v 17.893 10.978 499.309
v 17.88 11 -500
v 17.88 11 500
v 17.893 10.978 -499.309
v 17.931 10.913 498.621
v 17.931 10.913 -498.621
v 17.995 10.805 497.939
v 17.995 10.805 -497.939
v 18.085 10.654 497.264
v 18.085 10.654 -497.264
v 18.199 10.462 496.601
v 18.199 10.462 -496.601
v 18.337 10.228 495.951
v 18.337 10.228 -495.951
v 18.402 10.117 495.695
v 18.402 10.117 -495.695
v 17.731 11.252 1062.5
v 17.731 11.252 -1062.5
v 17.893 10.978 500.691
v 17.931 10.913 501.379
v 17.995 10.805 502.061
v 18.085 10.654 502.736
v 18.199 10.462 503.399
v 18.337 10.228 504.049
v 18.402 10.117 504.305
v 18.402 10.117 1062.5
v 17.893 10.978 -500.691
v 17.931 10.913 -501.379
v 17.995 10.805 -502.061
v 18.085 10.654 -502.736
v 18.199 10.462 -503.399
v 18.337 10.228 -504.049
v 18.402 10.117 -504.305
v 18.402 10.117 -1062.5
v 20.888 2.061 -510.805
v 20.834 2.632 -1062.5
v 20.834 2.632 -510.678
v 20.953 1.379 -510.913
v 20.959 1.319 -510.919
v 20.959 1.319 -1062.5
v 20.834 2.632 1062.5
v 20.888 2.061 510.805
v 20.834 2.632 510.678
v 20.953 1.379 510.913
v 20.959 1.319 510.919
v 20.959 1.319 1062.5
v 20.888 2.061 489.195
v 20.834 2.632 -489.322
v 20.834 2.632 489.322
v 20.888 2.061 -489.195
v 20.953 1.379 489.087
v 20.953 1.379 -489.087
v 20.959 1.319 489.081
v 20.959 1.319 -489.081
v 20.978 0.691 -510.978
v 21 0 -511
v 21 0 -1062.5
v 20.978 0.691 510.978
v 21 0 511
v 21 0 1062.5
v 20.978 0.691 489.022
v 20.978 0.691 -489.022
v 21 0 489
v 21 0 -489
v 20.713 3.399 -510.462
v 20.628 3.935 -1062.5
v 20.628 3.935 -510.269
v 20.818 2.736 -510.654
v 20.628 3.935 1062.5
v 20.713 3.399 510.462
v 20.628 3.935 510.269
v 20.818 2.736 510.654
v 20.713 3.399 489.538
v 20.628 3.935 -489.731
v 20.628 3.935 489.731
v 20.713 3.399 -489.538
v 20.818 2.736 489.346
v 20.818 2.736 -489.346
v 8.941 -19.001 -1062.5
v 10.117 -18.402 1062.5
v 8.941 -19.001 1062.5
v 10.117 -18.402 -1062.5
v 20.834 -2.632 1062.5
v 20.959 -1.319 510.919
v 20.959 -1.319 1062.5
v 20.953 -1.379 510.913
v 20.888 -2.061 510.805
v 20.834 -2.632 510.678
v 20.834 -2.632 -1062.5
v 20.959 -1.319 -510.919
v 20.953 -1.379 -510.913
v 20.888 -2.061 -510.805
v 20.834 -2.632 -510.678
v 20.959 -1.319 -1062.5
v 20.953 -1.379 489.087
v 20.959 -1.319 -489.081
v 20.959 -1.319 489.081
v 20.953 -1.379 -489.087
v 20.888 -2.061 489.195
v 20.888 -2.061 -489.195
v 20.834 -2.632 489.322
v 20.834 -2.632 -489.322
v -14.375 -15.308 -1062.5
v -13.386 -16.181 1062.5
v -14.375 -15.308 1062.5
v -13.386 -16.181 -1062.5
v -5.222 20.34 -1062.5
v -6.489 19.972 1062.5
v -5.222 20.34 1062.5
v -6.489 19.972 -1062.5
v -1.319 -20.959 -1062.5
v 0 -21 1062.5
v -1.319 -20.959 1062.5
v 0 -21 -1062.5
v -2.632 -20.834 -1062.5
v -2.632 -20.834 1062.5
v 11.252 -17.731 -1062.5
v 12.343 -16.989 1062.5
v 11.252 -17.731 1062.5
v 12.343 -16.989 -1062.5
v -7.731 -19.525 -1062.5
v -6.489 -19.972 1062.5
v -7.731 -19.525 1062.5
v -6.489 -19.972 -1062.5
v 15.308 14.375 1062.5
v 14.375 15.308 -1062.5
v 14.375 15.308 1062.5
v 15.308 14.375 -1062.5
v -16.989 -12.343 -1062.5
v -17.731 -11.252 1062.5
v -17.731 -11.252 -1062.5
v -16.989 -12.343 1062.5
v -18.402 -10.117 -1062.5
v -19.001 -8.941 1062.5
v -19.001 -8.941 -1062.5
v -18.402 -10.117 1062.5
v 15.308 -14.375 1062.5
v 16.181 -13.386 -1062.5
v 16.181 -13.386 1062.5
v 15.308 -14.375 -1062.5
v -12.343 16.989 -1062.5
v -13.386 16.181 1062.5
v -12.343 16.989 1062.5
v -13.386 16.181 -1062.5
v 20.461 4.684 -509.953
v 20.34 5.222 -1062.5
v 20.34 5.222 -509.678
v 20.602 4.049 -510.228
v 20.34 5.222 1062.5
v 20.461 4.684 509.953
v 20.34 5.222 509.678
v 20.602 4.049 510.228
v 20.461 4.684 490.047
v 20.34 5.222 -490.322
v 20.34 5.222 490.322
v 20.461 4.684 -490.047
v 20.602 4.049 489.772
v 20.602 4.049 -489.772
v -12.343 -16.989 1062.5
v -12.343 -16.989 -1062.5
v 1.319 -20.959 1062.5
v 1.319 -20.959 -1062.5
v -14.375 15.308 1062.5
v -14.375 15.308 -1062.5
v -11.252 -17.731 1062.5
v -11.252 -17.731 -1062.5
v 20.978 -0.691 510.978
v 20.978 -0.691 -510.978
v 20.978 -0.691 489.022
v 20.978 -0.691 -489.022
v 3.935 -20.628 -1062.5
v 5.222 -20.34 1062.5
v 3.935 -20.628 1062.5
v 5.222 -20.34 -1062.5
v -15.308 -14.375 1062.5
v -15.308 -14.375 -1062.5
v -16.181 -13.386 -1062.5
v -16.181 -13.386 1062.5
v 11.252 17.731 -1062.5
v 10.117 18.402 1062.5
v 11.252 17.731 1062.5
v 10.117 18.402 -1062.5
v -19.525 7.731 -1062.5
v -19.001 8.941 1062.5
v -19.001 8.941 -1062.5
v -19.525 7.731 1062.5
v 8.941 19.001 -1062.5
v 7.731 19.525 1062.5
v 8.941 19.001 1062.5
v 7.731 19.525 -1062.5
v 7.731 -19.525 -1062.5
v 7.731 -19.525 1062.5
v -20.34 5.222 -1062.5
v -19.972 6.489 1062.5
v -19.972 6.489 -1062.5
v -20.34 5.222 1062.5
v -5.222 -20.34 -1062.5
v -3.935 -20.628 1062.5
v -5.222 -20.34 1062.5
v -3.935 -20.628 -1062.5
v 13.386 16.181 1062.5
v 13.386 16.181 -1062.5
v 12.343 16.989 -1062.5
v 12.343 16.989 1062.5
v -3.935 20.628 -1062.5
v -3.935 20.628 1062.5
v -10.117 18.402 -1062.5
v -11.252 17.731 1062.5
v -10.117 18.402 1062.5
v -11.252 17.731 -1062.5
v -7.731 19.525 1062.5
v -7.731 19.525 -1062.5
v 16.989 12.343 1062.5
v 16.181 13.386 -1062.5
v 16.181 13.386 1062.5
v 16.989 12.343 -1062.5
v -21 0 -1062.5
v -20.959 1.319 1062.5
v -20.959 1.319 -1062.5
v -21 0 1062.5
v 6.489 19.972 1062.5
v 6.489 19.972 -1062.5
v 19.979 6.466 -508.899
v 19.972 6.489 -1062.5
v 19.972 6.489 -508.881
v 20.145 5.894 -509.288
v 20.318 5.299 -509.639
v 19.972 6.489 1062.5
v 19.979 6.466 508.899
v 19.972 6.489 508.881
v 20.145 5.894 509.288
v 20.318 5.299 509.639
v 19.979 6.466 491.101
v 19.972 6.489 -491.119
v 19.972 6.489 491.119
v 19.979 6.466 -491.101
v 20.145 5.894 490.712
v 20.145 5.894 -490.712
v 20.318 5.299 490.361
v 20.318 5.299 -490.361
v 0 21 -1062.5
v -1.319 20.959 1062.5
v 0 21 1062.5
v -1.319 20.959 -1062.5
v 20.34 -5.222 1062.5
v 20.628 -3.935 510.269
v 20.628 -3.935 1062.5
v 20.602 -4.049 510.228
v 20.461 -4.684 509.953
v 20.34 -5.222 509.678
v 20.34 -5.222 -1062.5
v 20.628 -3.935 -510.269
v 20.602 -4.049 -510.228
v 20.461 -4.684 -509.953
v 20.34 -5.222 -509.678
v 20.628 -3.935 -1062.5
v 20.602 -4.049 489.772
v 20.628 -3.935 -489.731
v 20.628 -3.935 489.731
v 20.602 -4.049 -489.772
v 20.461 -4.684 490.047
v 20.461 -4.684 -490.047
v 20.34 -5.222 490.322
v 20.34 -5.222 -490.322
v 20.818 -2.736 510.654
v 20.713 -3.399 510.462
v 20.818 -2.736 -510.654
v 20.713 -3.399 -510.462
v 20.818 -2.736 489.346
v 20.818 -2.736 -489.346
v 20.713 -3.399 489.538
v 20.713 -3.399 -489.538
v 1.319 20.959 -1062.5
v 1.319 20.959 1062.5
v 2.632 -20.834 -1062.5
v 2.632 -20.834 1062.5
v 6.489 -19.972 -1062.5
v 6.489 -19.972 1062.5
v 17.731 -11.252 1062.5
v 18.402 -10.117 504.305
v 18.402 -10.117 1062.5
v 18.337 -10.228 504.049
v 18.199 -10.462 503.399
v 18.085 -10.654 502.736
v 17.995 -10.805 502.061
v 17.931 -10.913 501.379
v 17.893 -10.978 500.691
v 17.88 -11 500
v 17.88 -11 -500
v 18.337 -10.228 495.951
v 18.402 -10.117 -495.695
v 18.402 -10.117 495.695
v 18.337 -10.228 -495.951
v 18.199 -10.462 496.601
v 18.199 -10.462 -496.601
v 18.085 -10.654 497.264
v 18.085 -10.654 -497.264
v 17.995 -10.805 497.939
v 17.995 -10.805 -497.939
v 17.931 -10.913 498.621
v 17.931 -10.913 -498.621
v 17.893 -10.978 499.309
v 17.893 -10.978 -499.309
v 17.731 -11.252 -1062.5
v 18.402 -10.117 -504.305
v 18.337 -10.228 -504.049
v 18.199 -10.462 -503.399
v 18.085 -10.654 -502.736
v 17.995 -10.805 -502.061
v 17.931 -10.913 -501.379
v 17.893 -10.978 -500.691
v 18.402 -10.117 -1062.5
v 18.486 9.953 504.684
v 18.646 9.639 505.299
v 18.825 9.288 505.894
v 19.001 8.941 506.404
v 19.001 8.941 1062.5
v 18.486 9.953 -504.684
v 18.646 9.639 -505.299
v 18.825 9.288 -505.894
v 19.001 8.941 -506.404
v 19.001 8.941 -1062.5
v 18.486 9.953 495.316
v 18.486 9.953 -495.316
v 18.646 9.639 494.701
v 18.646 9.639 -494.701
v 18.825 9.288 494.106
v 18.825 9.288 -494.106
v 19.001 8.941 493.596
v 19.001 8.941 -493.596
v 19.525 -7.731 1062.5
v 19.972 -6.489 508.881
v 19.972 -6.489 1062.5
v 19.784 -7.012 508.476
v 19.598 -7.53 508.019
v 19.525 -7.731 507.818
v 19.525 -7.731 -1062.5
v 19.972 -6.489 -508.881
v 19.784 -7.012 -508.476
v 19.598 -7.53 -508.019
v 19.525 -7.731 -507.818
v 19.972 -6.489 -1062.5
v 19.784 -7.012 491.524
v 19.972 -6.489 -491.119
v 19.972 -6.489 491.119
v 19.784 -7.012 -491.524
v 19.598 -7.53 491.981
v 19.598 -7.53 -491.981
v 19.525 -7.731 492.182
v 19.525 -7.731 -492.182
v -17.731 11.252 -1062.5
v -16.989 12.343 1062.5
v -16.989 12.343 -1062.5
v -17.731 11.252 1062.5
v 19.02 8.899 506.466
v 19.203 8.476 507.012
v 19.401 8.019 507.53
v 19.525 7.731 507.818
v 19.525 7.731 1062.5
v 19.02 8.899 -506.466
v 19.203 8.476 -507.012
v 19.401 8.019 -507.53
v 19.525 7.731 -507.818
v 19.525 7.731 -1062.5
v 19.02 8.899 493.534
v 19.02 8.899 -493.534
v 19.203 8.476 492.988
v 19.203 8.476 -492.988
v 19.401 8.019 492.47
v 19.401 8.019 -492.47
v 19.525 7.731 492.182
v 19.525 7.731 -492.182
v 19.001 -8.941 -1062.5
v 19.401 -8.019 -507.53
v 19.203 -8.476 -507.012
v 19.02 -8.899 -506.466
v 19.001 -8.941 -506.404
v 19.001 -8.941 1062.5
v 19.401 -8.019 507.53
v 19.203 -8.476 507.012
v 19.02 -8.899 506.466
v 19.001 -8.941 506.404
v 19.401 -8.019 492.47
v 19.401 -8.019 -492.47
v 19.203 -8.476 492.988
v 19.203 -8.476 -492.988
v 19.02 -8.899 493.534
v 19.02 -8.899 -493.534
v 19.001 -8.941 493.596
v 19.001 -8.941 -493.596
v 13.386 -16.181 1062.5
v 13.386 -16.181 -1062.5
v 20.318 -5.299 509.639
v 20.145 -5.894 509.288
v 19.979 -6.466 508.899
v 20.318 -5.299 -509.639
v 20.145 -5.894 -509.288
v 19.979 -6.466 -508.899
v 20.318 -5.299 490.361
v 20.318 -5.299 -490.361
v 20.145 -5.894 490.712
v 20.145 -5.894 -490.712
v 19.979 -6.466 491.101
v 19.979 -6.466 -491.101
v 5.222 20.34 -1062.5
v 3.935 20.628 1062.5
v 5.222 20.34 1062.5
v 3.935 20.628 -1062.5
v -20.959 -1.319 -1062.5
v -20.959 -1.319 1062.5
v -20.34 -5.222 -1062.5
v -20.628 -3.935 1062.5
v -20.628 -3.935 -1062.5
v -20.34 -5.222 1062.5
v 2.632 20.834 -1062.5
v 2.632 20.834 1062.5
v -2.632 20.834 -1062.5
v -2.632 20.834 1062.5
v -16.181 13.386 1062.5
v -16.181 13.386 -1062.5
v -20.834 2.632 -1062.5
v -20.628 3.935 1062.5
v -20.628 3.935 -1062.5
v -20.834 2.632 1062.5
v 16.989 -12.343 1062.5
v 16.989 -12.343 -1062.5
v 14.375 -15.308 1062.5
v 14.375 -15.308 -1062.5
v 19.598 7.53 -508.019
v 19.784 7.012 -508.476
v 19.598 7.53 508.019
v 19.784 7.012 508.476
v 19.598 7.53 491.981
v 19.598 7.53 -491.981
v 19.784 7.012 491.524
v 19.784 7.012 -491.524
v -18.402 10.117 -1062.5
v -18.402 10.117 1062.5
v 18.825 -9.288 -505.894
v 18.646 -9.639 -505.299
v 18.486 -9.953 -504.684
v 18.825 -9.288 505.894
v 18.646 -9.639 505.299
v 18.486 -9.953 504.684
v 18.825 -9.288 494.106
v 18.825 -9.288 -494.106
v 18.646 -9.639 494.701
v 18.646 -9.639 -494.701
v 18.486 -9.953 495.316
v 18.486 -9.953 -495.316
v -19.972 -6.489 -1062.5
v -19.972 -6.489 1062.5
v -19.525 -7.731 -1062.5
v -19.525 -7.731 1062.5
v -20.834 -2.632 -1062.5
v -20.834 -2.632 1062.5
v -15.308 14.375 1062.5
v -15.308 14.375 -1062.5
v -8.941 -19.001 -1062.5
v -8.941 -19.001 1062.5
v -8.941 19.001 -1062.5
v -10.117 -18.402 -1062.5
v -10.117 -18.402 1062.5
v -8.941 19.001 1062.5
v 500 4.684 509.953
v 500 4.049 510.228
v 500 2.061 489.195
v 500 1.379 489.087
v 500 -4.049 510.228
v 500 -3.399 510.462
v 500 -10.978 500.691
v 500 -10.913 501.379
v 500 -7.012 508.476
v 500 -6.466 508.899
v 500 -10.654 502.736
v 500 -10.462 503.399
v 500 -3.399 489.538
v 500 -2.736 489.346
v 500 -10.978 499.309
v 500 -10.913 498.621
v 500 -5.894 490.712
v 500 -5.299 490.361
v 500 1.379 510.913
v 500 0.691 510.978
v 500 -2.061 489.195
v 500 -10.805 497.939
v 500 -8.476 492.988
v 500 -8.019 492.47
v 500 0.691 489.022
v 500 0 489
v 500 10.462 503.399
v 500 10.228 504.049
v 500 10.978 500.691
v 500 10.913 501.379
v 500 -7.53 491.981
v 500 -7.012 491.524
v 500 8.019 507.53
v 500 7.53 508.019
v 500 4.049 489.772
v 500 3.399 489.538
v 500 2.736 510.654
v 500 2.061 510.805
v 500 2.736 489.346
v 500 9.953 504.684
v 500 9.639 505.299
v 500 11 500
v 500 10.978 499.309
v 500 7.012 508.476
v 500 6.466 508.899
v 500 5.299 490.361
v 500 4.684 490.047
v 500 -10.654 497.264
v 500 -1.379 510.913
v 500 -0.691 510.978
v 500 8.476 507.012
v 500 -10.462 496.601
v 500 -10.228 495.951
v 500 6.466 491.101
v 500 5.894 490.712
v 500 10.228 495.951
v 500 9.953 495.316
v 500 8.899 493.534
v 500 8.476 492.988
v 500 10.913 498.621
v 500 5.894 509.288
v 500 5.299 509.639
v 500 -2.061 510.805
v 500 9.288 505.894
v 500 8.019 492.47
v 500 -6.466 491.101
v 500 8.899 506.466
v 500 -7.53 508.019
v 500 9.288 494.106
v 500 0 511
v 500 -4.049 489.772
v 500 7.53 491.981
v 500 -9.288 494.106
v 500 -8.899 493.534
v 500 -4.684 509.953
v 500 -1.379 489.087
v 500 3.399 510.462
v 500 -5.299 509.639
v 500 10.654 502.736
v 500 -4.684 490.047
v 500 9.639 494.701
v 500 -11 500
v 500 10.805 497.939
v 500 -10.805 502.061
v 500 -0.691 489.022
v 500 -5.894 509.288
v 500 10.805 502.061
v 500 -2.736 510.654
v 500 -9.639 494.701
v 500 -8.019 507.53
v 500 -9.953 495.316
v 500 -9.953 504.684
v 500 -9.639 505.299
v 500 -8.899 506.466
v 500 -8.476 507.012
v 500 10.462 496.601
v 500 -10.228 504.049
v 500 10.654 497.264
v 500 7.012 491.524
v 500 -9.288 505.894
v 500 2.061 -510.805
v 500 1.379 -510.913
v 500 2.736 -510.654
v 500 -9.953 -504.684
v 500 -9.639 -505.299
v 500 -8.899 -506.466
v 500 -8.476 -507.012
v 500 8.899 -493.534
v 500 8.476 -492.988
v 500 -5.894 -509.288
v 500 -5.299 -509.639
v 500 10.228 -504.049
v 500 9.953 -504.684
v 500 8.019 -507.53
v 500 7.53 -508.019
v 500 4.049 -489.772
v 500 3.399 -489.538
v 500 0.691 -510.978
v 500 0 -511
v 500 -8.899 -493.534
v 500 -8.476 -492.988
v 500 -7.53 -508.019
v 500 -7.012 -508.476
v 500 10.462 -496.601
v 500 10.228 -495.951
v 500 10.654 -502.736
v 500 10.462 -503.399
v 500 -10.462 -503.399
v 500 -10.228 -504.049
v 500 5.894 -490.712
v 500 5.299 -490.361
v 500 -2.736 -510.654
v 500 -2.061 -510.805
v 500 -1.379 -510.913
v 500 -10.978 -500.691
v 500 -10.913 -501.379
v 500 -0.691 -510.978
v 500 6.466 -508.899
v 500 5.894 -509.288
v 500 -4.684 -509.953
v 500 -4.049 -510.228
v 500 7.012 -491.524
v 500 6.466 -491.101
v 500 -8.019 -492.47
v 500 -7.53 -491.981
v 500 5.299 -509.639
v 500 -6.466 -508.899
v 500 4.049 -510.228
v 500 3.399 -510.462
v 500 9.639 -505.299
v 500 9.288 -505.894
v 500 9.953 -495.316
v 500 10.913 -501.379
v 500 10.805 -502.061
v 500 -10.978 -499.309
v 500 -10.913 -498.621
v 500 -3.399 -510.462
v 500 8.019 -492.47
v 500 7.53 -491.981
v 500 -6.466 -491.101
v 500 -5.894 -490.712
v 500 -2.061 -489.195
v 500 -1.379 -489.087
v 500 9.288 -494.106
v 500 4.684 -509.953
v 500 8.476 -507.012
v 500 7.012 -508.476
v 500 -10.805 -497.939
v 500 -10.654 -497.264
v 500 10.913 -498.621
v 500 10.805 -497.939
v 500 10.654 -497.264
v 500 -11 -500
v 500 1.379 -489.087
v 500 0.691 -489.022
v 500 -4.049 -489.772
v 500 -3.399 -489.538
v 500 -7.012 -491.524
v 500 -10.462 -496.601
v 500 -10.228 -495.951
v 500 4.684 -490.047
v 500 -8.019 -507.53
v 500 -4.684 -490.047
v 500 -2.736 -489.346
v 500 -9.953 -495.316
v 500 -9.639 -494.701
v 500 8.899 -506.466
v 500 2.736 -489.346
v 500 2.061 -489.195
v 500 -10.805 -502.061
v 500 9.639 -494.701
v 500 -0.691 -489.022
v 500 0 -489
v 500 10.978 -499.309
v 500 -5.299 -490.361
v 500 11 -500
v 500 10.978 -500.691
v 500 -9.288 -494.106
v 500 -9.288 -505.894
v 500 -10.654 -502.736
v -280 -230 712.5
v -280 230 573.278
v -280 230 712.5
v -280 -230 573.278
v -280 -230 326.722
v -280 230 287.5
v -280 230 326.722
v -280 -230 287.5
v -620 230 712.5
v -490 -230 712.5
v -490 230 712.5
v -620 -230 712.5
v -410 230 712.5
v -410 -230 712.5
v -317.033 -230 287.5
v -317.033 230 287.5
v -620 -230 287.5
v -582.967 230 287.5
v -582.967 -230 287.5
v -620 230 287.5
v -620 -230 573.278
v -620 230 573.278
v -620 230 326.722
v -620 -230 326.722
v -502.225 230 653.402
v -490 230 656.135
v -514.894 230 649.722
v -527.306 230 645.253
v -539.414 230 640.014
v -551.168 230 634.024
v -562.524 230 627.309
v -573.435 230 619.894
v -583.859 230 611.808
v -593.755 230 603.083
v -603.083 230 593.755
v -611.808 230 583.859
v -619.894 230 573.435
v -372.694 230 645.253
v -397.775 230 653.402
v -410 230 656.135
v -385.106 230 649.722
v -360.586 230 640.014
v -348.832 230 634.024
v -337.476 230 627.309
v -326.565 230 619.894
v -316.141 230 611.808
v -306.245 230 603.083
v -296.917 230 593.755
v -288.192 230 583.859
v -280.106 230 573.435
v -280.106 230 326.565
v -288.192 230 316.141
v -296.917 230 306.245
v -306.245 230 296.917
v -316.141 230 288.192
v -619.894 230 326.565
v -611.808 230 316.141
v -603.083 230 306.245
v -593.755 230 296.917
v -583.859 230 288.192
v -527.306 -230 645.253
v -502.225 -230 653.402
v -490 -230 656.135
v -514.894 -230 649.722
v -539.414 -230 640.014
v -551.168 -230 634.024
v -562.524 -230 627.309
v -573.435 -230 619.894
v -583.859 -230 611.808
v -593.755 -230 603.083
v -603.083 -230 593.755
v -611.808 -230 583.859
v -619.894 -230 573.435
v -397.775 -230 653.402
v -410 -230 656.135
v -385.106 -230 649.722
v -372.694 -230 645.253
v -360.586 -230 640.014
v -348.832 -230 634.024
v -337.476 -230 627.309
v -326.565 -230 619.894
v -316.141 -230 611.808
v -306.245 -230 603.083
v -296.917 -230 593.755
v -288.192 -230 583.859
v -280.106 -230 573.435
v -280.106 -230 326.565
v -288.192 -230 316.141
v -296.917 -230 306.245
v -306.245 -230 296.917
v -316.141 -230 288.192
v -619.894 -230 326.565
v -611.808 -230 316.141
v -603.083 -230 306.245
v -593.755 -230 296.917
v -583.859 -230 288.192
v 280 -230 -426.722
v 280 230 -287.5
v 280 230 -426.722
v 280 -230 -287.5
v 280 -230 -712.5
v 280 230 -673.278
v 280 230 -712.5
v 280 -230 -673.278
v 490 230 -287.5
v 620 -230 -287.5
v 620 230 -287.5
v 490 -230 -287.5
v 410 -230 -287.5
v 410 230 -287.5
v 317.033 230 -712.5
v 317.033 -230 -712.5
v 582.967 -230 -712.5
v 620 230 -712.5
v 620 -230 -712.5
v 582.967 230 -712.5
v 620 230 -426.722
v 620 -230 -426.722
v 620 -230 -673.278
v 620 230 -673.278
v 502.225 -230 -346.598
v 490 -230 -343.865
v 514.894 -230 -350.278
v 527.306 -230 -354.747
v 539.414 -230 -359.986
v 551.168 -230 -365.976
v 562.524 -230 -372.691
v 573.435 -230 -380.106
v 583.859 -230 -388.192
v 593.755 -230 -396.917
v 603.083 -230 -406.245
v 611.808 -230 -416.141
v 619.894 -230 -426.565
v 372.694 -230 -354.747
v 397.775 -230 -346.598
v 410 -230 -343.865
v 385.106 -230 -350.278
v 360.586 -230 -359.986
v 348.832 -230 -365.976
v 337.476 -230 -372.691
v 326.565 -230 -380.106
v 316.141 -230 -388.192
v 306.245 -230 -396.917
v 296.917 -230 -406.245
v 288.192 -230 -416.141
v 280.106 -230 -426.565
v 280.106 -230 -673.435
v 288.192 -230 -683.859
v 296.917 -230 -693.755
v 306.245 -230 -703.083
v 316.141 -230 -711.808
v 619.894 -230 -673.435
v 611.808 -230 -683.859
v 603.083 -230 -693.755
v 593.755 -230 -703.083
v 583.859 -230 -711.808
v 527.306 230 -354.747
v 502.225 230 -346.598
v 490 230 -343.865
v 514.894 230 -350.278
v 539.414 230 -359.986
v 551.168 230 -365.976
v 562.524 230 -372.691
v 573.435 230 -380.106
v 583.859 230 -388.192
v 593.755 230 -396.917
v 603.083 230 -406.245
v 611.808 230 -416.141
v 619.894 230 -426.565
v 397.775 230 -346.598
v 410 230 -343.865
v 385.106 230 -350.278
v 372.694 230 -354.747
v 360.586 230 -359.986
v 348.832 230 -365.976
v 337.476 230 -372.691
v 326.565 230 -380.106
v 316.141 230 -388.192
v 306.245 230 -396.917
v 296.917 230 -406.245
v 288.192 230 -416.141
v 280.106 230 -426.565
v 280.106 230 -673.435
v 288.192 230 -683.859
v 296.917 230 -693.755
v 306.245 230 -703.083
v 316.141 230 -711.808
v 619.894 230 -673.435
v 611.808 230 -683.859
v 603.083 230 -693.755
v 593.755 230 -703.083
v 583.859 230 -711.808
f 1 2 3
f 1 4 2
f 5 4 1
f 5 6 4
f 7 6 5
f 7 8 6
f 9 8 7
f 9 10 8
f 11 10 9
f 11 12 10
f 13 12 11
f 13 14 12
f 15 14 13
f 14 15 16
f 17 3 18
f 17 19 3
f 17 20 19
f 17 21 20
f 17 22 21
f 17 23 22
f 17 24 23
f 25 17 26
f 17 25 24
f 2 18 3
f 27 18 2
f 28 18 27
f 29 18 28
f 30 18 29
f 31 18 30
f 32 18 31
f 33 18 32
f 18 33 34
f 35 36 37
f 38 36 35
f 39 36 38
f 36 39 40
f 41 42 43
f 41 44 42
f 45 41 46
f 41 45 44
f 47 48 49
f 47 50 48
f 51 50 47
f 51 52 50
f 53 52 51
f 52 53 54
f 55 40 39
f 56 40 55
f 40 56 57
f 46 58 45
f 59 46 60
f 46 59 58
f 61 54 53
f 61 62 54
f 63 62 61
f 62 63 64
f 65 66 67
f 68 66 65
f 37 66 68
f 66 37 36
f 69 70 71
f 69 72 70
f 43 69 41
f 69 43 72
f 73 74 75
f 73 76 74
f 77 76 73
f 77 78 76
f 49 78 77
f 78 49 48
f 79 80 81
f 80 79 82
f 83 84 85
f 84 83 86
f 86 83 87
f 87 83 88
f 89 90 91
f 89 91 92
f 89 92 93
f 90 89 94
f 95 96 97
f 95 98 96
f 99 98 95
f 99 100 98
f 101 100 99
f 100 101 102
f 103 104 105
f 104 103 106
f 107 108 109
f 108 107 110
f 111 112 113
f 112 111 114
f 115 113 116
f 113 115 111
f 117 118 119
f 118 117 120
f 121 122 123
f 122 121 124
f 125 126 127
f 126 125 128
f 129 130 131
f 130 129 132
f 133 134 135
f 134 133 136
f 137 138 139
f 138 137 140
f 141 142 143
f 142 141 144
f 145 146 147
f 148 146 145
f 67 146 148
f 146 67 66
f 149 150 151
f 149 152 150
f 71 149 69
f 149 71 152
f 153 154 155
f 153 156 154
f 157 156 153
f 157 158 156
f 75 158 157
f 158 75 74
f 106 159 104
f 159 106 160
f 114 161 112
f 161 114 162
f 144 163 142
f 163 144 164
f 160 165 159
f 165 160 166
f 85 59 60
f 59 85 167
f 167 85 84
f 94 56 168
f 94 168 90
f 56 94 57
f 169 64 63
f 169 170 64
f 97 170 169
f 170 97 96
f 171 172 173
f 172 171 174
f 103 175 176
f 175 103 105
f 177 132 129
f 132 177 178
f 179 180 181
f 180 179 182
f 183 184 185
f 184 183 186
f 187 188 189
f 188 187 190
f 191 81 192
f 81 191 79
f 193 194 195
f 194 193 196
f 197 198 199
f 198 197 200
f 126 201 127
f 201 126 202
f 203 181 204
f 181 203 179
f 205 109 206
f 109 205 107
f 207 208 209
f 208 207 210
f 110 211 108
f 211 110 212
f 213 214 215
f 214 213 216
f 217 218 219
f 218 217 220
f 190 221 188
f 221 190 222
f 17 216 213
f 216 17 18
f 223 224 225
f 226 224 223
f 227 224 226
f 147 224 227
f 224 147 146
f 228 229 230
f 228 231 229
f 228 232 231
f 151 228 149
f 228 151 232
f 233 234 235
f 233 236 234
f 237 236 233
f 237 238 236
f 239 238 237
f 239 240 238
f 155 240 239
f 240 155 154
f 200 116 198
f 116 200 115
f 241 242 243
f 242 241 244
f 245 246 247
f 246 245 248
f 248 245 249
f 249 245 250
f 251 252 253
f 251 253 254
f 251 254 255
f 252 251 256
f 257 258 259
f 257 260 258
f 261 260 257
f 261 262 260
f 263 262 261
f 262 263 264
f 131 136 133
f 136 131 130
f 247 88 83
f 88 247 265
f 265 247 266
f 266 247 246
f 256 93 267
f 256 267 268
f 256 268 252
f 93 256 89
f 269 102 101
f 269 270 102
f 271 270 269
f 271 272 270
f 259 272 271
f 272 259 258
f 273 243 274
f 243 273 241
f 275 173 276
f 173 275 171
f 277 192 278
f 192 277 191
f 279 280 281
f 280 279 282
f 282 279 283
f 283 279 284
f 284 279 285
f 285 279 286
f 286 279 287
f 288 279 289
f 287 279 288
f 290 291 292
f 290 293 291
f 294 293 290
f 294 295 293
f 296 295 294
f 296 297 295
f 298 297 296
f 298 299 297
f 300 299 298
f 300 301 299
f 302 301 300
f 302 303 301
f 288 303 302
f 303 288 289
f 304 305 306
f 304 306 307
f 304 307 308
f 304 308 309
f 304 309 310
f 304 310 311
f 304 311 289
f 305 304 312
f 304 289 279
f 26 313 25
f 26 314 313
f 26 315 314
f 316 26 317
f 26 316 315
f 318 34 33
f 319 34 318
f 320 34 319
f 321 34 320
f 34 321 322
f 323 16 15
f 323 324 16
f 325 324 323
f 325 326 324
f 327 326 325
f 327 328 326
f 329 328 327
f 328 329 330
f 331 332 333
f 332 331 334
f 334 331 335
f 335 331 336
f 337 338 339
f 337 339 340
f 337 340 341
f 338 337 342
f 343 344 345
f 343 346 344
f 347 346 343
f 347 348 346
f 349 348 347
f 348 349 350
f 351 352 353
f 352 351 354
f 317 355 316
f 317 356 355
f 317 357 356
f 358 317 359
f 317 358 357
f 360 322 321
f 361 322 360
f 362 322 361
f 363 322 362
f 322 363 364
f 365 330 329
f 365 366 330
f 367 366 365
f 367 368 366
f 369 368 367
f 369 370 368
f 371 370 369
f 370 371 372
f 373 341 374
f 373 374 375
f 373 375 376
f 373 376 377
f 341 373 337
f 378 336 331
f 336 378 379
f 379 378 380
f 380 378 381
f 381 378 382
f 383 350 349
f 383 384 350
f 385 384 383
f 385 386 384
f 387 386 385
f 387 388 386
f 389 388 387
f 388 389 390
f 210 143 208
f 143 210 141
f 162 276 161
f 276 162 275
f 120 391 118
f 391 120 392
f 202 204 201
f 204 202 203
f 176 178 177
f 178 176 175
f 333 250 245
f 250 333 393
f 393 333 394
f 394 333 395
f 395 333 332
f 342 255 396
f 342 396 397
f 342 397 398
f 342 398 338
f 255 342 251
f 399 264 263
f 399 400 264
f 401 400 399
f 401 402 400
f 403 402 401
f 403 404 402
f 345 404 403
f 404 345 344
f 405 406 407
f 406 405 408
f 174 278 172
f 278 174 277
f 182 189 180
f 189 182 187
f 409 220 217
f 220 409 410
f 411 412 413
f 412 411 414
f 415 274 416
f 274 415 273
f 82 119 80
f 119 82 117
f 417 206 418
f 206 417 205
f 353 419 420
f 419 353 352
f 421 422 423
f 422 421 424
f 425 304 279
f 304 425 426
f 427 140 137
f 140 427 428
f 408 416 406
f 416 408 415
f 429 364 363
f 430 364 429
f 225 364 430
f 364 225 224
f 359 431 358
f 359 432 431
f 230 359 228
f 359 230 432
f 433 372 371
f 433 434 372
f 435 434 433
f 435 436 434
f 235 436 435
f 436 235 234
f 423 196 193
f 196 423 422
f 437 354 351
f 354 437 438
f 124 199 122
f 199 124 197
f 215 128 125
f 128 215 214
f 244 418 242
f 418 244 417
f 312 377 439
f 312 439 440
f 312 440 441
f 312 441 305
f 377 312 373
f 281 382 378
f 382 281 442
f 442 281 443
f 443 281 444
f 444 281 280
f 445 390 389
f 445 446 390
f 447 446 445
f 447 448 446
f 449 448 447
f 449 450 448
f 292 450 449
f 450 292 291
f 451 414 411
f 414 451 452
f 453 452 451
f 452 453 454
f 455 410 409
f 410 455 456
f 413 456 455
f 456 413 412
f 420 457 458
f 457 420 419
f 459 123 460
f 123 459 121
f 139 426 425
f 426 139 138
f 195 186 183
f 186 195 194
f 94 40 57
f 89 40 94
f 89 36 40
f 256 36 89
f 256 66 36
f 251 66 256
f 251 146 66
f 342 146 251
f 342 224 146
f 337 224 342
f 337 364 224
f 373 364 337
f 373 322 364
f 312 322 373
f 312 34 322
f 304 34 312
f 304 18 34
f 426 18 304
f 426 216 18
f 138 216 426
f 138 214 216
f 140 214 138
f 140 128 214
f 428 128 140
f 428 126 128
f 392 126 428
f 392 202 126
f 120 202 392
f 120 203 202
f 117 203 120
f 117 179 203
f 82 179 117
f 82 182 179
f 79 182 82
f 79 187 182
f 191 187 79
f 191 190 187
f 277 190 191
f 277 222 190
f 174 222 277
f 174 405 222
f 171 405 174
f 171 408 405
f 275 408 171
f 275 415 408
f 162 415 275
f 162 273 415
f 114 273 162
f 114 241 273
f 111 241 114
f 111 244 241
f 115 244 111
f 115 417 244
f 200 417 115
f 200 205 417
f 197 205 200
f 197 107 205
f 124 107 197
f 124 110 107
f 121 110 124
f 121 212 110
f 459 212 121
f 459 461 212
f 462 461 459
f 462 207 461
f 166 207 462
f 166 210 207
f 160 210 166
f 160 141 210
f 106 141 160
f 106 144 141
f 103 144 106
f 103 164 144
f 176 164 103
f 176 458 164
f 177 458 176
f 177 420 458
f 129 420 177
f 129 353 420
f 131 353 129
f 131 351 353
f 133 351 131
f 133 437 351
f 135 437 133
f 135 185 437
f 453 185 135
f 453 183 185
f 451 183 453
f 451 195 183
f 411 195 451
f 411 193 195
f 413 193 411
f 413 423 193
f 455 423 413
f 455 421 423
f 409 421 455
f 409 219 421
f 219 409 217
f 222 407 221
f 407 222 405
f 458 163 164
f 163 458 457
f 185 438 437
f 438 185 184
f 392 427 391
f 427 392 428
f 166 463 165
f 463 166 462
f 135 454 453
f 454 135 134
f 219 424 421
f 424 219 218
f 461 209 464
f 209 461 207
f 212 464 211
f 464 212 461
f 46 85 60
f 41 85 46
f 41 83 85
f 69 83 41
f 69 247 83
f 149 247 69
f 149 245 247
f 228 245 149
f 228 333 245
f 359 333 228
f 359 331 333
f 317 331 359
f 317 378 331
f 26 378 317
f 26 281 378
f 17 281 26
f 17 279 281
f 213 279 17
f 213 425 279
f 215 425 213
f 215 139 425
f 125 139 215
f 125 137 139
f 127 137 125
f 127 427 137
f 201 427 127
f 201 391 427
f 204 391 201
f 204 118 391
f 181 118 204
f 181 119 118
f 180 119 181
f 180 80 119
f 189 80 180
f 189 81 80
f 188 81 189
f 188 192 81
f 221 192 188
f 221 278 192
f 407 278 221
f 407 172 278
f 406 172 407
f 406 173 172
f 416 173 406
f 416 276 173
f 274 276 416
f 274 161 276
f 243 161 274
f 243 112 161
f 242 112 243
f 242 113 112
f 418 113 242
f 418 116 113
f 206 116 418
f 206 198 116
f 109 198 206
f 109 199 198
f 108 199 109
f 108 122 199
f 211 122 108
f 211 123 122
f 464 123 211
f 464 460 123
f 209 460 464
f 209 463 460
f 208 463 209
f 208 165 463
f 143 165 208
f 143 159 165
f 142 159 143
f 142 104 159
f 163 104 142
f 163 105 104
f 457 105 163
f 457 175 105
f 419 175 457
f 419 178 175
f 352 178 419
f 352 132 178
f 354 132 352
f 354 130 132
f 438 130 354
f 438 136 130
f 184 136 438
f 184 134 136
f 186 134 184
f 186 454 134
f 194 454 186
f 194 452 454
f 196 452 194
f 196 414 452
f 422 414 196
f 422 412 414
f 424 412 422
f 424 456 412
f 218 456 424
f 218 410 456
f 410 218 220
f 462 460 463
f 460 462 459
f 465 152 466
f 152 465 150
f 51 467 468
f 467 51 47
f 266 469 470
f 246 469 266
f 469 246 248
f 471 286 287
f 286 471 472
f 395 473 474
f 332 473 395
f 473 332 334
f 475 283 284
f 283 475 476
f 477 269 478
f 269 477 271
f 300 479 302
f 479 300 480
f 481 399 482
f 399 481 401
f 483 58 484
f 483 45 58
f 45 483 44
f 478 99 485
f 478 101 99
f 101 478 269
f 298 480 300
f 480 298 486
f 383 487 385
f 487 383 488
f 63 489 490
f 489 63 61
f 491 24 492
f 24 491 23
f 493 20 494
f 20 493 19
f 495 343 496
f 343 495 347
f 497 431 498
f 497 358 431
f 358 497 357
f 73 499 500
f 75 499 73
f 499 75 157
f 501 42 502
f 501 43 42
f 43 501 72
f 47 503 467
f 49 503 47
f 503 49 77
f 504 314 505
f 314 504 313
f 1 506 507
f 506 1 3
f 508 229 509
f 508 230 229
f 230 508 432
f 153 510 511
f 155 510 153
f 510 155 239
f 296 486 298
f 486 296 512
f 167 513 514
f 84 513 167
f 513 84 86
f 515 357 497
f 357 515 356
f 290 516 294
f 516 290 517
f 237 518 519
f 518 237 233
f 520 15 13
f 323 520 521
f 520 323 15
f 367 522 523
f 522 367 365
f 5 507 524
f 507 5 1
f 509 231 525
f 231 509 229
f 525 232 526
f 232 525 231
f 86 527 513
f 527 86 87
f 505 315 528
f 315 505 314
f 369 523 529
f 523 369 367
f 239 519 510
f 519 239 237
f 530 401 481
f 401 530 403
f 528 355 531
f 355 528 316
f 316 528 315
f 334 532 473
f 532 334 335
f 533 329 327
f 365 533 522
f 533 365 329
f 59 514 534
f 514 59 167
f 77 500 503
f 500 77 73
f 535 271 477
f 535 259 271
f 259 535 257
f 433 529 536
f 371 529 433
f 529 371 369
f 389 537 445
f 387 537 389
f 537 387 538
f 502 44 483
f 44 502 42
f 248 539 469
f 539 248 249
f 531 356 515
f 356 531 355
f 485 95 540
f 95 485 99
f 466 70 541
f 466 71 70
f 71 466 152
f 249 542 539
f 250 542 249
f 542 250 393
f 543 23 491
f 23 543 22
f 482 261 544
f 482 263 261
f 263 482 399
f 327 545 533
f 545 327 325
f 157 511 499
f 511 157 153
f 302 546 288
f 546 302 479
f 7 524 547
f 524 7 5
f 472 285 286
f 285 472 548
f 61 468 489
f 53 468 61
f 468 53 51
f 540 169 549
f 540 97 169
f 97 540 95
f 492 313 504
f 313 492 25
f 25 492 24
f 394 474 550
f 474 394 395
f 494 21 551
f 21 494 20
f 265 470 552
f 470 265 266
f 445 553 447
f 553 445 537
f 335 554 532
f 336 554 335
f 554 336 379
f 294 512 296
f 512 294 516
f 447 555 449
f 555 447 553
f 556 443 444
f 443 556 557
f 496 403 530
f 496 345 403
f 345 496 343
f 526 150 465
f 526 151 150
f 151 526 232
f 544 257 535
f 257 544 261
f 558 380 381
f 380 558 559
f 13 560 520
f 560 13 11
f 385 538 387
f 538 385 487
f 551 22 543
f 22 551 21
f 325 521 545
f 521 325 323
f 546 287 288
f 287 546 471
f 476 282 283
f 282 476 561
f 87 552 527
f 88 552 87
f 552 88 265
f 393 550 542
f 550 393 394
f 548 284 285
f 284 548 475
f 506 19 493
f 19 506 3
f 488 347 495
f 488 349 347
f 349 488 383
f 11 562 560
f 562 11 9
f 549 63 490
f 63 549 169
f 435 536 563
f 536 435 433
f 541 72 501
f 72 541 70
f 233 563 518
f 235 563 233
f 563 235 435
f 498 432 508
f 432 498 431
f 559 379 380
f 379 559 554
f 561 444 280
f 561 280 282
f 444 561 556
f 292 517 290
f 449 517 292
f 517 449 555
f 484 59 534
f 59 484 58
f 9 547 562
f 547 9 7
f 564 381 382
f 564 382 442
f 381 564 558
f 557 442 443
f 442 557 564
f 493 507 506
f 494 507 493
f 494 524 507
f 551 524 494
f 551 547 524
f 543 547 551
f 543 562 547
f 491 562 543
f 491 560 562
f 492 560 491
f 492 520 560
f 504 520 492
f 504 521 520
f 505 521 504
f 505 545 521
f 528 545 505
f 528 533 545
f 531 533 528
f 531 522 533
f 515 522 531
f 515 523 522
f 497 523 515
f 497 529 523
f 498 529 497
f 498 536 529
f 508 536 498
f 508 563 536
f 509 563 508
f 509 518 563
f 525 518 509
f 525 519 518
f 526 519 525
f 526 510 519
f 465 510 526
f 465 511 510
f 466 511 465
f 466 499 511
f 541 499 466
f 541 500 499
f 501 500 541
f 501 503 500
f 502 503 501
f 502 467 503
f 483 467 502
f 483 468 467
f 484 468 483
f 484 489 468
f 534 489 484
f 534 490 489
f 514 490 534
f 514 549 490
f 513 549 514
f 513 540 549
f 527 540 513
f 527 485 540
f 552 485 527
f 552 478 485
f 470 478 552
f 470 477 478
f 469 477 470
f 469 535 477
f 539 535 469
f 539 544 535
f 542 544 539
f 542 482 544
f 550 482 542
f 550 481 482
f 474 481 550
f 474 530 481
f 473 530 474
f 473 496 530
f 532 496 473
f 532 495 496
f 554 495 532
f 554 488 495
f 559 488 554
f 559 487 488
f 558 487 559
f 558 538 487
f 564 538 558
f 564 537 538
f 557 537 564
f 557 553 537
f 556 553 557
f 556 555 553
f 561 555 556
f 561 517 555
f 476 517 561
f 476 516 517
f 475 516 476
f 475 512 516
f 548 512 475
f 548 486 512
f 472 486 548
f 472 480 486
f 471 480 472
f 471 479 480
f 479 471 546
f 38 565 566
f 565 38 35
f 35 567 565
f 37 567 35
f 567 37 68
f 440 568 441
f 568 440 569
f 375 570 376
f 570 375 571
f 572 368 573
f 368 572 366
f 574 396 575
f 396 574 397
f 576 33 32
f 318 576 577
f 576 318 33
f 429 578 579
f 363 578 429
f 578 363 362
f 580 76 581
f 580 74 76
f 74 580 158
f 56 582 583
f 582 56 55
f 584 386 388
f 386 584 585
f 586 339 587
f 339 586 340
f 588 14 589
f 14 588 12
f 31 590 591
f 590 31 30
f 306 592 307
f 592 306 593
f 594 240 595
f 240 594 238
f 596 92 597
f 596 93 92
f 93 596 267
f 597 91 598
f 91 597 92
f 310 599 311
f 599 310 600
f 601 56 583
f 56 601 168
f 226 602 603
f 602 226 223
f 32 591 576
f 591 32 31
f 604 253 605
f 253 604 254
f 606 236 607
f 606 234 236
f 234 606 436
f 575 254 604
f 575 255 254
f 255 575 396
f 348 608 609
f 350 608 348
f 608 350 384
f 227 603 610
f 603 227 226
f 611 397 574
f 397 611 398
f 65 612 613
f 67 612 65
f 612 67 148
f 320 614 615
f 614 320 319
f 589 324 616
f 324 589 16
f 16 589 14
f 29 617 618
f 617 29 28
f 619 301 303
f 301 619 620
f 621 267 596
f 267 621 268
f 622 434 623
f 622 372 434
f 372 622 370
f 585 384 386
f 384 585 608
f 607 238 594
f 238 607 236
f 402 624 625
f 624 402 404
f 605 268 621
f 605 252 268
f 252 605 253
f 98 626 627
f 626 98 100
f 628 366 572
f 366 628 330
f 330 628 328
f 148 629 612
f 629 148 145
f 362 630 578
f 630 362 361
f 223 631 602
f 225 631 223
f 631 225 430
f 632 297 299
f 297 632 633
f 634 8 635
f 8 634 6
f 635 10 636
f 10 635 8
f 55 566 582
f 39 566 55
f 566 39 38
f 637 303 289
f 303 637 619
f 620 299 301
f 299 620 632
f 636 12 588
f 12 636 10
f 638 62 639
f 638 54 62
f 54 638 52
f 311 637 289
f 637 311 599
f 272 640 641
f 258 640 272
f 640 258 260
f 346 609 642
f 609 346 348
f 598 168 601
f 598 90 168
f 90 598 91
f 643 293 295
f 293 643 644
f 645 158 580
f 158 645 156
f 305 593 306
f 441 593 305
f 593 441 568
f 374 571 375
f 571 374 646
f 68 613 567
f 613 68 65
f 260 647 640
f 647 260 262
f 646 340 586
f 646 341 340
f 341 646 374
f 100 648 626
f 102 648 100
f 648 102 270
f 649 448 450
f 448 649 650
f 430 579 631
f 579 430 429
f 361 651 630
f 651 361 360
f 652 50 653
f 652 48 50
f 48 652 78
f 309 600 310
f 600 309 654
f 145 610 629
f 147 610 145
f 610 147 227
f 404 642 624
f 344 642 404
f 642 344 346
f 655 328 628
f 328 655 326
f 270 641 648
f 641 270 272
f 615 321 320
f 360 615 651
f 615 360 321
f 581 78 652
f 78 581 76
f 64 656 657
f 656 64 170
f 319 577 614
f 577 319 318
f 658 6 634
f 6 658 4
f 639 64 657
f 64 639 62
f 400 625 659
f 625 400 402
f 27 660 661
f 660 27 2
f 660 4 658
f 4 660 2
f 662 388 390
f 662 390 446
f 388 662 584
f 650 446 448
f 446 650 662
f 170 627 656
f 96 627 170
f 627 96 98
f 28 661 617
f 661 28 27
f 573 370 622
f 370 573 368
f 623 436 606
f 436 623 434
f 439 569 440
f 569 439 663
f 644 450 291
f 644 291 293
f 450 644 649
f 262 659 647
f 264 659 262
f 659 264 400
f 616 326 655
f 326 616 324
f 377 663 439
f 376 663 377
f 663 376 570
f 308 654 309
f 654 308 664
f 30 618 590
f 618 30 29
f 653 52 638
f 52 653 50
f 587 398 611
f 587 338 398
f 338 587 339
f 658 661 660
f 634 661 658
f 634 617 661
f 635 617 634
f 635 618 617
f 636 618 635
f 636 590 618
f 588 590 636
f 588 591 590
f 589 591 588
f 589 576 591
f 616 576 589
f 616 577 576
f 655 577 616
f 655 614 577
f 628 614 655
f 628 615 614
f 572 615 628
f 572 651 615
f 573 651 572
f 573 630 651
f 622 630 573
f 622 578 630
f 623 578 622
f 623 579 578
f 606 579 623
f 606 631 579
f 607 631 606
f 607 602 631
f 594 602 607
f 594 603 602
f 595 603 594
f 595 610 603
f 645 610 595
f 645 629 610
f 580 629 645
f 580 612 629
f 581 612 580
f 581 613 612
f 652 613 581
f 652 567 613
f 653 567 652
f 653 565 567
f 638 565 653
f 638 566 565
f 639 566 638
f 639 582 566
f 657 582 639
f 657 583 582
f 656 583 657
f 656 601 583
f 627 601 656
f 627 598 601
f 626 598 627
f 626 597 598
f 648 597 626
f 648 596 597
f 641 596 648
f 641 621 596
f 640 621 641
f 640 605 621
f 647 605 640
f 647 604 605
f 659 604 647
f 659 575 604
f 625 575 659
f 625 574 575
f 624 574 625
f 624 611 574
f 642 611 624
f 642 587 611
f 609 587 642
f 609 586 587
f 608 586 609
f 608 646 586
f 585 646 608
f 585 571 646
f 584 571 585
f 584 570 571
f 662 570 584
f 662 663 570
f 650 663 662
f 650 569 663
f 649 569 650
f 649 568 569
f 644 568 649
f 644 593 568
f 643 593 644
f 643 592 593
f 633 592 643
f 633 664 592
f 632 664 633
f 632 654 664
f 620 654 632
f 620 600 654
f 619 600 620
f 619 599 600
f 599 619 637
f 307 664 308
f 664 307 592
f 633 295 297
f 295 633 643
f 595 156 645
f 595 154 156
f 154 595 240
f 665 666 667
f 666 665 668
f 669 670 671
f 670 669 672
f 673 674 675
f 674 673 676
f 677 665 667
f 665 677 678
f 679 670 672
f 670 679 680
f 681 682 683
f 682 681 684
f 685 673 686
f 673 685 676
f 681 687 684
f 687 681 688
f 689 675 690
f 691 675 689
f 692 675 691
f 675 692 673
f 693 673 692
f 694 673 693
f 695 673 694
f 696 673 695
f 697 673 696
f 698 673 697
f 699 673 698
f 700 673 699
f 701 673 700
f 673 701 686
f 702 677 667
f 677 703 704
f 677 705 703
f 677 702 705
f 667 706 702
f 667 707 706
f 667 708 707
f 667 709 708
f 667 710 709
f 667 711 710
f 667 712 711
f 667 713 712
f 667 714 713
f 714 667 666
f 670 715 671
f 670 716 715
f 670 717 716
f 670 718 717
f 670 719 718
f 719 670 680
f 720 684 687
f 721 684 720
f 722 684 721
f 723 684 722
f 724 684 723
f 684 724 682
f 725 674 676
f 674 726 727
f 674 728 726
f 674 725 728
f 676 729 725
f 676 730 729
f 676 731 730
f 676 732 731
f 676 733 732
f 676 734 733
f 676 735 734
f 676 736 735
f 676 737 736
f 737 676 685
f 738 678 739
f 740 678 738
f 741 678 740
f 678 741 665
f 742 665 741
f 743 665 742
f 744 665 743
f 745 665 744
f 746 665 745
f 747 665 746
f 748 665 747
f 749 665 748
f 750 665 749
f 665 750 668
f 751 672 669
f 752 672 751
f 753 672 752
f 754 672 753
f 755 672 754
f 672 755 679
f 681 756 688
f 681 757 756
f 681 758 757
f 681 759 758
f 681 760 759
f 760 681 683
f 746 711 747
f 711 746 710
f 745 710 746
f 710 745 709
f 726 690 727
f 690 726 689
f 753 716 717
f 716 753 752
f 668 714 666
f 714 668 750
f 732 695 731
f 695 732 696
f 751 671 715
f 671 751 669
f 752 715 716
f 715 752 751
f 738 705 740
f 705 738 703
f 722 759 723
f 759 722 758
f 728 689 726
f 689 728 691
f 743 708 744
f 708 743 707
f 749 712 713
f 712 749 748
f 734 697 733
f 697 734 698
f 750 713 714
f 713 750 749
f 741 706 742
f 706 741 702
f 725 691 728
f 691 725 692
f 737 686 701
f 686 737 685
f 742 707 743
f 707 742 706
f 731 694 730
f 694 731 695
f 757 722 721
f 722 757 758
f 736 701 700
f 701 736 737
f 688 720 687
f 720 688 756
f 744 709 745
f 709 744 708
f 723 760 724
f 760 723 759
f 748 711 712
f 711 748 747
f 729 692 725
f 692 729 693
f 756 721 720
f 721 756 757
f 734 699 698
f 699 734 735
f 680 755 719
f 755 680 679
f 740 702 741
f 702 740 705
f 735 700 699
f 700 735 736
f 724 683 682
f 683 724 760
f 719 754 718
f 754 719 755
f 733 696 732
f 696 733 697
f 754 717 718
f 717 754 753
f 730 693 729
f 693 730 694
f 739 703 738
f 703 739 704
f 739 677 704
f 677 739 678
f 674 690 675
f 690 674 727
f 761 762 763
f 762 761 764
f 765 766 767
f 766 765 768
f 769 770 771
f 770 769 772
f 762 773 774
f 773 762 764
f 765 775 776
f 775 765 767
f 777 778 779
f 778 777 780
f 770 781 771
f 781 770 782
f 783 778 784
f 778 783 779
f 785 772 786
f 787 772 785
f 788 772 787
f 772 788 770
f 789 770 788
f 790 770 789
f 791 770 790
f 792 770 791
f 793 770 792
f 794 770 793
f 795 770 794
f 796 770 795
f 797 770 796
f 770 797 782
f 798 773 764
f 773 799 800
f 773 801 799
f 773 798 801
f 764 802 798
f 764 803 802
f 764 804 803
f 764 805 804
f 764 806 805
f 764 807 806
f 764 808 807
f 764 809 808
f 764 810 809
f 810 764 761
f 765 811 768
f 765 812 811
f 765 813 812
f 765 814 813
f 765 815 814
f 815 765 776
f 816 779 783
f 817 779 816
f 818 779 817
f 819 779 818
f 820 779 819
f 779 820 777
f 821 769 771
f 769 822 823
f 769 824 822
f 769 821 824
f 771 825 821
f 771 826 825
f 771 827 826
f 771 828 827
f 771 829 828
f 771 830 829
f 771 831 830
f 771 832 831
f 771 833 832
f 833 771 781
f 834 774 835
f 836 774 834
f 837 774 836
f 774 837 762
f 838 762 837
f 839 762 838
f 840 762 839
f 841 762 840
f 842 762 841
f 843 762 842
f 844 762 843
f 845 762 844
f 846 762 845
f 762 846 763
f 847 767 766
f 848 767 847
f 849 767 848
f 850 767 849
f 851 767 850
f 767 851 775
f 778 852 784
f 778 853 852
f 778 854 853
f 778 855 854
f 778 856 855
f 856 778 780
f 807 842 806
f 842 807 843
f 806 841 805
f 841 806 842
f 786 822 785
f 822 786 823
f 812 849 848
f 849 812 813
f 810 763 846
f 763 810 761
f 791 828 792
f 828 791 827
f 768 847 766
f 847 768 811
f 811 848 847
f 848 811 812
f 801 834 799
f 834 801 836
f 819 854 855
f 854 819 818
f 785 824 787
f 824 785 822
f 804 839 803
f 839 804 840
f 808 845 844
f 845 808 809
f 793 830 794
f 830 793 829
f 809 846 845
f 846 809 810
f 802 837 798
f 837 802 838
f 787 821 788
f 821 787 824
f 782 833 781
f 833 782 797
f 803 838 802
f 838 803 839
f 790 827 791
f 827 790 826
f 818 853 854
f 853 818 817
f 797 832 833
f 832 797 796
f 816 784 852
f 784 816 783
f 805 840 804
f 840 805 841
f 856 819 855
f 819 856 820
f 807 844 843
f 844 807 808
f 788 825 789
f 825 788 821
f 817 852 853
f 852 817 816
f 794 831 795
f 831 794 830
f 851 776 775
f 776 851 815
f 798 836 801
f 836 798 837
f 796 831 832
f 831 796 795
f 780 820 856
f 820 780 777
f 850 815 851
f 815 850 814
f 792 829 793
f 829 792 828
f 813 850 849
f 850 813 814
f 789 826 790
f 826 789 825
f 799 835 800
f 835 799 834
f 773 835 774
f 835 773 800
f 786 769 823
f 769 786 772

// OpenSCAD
// ============================================================================
// PROJECT: XXXG-00W0 WING GUNDAM ZERO EW - AIRFRAME STRUCTURAL CORE
// COMPONENT VAULT: BANDAI CAST RUNNER G - SHOULDER LINKAGES G4 & G5
// CIRCUIT RULES: FULL SQUARE-WAVE RETROFITTING & INDUCTIVE POWER PLUGS
// MASS PARITY: FINAL ARM WEIGHT EXTRACTED BEFORE GLOBAL LEG REBALANCING
// ============================================================================

$fn = 100; // Circular segment rendering resolution count

// Sizing Constants Scaled 1:1 for a 16.7-Meter Airframe Scale (mm)
shoulder_link_height = 850;             // Total longitudinal axis height (mm)
pivot_bore_diameter = 420;              // Internal rotational joint bearing path (mm)
titanium_frame_wall = 65;               // Solid TiAl structural wall thickness (mm)
harness_conduit_width = 80;             // Cast-in 4oz copper logic trace track (mm)

module Runner_G_Shoulder_Forge() {
    // Central Supply Injection Runner Axis (Molten Feed Line from Siphon Forge)
    color([0.22, 0.22, 0.25]) {
        cylinder(h = shoulder_link_height * 2.5, d = 42, center = true);
        // Direct injection gates tracking straight into the part mold cavities
        translate([0, 0, 500]) rotate([0, 90, 0]) cylinder(h = 500, d = 22);
        translate([0, 0, -500]) rotate([0, 90, 0]) cylinder(h = 500, d = 22);
    }
    
    // Instantiate Scaled Skeutomorphic Part Molds Symmetrically
    Cast_Internal_Shoulder_Linkages();
}

module Cast_Internal_Shoulder_Linkages() {
    // ---- PART G4: INTERNAL LEFT SHOULDER SWIVEL LINKAGE ---- [Page 4, Step 05-1]
    translate([-450, 0, 500]) color([0.35, 0.35, 0.38]) { // Inner Frame Gunmetal Spec
        difference() {
            // Heavy-duty structural yoke block mounting to the chest cowl
            cube([340, 460, shoulder_link_height * 0.5], center = true);
            
            // Concentric Internal Boring for the Forward Extension Bearing Track
            translate([0, 0, -50])
                rotate([90, 0, 0])
                    cylinder(h = 500, d = pivot_bore_diameter, center = true);
            
            // Continuous cast-in routing track for the 4oz solid-state wiring rails
            cube([harness_conduit_width, 500, shoulder_link_height], center = true);
        }
    }
    
    // ---- PART G5: INTERNAL RIGHT SHOULDER SWIVEL LINKAGE ---- [Page 4, Step 05-1]
    translate([450, 0, -500]) rotate([0, 0, 180]) color([0.35, 0.35, 0.38]) {
        difference() {
            cube([340, 460, shoulder_link_height * 0.5], center = true);
            translate([0, 0, -50])
                rotate([90, 0, 0])
                    cylinder(h = 500, d = pivot_bore_diameter, center = true);
            cube([harness_conduit_width, 500, shoulder_link_height], center = true);
        }
    }
}

// Render Master Assembly to Parameter Workspace
Runner_G_Shoulder_Forge();
